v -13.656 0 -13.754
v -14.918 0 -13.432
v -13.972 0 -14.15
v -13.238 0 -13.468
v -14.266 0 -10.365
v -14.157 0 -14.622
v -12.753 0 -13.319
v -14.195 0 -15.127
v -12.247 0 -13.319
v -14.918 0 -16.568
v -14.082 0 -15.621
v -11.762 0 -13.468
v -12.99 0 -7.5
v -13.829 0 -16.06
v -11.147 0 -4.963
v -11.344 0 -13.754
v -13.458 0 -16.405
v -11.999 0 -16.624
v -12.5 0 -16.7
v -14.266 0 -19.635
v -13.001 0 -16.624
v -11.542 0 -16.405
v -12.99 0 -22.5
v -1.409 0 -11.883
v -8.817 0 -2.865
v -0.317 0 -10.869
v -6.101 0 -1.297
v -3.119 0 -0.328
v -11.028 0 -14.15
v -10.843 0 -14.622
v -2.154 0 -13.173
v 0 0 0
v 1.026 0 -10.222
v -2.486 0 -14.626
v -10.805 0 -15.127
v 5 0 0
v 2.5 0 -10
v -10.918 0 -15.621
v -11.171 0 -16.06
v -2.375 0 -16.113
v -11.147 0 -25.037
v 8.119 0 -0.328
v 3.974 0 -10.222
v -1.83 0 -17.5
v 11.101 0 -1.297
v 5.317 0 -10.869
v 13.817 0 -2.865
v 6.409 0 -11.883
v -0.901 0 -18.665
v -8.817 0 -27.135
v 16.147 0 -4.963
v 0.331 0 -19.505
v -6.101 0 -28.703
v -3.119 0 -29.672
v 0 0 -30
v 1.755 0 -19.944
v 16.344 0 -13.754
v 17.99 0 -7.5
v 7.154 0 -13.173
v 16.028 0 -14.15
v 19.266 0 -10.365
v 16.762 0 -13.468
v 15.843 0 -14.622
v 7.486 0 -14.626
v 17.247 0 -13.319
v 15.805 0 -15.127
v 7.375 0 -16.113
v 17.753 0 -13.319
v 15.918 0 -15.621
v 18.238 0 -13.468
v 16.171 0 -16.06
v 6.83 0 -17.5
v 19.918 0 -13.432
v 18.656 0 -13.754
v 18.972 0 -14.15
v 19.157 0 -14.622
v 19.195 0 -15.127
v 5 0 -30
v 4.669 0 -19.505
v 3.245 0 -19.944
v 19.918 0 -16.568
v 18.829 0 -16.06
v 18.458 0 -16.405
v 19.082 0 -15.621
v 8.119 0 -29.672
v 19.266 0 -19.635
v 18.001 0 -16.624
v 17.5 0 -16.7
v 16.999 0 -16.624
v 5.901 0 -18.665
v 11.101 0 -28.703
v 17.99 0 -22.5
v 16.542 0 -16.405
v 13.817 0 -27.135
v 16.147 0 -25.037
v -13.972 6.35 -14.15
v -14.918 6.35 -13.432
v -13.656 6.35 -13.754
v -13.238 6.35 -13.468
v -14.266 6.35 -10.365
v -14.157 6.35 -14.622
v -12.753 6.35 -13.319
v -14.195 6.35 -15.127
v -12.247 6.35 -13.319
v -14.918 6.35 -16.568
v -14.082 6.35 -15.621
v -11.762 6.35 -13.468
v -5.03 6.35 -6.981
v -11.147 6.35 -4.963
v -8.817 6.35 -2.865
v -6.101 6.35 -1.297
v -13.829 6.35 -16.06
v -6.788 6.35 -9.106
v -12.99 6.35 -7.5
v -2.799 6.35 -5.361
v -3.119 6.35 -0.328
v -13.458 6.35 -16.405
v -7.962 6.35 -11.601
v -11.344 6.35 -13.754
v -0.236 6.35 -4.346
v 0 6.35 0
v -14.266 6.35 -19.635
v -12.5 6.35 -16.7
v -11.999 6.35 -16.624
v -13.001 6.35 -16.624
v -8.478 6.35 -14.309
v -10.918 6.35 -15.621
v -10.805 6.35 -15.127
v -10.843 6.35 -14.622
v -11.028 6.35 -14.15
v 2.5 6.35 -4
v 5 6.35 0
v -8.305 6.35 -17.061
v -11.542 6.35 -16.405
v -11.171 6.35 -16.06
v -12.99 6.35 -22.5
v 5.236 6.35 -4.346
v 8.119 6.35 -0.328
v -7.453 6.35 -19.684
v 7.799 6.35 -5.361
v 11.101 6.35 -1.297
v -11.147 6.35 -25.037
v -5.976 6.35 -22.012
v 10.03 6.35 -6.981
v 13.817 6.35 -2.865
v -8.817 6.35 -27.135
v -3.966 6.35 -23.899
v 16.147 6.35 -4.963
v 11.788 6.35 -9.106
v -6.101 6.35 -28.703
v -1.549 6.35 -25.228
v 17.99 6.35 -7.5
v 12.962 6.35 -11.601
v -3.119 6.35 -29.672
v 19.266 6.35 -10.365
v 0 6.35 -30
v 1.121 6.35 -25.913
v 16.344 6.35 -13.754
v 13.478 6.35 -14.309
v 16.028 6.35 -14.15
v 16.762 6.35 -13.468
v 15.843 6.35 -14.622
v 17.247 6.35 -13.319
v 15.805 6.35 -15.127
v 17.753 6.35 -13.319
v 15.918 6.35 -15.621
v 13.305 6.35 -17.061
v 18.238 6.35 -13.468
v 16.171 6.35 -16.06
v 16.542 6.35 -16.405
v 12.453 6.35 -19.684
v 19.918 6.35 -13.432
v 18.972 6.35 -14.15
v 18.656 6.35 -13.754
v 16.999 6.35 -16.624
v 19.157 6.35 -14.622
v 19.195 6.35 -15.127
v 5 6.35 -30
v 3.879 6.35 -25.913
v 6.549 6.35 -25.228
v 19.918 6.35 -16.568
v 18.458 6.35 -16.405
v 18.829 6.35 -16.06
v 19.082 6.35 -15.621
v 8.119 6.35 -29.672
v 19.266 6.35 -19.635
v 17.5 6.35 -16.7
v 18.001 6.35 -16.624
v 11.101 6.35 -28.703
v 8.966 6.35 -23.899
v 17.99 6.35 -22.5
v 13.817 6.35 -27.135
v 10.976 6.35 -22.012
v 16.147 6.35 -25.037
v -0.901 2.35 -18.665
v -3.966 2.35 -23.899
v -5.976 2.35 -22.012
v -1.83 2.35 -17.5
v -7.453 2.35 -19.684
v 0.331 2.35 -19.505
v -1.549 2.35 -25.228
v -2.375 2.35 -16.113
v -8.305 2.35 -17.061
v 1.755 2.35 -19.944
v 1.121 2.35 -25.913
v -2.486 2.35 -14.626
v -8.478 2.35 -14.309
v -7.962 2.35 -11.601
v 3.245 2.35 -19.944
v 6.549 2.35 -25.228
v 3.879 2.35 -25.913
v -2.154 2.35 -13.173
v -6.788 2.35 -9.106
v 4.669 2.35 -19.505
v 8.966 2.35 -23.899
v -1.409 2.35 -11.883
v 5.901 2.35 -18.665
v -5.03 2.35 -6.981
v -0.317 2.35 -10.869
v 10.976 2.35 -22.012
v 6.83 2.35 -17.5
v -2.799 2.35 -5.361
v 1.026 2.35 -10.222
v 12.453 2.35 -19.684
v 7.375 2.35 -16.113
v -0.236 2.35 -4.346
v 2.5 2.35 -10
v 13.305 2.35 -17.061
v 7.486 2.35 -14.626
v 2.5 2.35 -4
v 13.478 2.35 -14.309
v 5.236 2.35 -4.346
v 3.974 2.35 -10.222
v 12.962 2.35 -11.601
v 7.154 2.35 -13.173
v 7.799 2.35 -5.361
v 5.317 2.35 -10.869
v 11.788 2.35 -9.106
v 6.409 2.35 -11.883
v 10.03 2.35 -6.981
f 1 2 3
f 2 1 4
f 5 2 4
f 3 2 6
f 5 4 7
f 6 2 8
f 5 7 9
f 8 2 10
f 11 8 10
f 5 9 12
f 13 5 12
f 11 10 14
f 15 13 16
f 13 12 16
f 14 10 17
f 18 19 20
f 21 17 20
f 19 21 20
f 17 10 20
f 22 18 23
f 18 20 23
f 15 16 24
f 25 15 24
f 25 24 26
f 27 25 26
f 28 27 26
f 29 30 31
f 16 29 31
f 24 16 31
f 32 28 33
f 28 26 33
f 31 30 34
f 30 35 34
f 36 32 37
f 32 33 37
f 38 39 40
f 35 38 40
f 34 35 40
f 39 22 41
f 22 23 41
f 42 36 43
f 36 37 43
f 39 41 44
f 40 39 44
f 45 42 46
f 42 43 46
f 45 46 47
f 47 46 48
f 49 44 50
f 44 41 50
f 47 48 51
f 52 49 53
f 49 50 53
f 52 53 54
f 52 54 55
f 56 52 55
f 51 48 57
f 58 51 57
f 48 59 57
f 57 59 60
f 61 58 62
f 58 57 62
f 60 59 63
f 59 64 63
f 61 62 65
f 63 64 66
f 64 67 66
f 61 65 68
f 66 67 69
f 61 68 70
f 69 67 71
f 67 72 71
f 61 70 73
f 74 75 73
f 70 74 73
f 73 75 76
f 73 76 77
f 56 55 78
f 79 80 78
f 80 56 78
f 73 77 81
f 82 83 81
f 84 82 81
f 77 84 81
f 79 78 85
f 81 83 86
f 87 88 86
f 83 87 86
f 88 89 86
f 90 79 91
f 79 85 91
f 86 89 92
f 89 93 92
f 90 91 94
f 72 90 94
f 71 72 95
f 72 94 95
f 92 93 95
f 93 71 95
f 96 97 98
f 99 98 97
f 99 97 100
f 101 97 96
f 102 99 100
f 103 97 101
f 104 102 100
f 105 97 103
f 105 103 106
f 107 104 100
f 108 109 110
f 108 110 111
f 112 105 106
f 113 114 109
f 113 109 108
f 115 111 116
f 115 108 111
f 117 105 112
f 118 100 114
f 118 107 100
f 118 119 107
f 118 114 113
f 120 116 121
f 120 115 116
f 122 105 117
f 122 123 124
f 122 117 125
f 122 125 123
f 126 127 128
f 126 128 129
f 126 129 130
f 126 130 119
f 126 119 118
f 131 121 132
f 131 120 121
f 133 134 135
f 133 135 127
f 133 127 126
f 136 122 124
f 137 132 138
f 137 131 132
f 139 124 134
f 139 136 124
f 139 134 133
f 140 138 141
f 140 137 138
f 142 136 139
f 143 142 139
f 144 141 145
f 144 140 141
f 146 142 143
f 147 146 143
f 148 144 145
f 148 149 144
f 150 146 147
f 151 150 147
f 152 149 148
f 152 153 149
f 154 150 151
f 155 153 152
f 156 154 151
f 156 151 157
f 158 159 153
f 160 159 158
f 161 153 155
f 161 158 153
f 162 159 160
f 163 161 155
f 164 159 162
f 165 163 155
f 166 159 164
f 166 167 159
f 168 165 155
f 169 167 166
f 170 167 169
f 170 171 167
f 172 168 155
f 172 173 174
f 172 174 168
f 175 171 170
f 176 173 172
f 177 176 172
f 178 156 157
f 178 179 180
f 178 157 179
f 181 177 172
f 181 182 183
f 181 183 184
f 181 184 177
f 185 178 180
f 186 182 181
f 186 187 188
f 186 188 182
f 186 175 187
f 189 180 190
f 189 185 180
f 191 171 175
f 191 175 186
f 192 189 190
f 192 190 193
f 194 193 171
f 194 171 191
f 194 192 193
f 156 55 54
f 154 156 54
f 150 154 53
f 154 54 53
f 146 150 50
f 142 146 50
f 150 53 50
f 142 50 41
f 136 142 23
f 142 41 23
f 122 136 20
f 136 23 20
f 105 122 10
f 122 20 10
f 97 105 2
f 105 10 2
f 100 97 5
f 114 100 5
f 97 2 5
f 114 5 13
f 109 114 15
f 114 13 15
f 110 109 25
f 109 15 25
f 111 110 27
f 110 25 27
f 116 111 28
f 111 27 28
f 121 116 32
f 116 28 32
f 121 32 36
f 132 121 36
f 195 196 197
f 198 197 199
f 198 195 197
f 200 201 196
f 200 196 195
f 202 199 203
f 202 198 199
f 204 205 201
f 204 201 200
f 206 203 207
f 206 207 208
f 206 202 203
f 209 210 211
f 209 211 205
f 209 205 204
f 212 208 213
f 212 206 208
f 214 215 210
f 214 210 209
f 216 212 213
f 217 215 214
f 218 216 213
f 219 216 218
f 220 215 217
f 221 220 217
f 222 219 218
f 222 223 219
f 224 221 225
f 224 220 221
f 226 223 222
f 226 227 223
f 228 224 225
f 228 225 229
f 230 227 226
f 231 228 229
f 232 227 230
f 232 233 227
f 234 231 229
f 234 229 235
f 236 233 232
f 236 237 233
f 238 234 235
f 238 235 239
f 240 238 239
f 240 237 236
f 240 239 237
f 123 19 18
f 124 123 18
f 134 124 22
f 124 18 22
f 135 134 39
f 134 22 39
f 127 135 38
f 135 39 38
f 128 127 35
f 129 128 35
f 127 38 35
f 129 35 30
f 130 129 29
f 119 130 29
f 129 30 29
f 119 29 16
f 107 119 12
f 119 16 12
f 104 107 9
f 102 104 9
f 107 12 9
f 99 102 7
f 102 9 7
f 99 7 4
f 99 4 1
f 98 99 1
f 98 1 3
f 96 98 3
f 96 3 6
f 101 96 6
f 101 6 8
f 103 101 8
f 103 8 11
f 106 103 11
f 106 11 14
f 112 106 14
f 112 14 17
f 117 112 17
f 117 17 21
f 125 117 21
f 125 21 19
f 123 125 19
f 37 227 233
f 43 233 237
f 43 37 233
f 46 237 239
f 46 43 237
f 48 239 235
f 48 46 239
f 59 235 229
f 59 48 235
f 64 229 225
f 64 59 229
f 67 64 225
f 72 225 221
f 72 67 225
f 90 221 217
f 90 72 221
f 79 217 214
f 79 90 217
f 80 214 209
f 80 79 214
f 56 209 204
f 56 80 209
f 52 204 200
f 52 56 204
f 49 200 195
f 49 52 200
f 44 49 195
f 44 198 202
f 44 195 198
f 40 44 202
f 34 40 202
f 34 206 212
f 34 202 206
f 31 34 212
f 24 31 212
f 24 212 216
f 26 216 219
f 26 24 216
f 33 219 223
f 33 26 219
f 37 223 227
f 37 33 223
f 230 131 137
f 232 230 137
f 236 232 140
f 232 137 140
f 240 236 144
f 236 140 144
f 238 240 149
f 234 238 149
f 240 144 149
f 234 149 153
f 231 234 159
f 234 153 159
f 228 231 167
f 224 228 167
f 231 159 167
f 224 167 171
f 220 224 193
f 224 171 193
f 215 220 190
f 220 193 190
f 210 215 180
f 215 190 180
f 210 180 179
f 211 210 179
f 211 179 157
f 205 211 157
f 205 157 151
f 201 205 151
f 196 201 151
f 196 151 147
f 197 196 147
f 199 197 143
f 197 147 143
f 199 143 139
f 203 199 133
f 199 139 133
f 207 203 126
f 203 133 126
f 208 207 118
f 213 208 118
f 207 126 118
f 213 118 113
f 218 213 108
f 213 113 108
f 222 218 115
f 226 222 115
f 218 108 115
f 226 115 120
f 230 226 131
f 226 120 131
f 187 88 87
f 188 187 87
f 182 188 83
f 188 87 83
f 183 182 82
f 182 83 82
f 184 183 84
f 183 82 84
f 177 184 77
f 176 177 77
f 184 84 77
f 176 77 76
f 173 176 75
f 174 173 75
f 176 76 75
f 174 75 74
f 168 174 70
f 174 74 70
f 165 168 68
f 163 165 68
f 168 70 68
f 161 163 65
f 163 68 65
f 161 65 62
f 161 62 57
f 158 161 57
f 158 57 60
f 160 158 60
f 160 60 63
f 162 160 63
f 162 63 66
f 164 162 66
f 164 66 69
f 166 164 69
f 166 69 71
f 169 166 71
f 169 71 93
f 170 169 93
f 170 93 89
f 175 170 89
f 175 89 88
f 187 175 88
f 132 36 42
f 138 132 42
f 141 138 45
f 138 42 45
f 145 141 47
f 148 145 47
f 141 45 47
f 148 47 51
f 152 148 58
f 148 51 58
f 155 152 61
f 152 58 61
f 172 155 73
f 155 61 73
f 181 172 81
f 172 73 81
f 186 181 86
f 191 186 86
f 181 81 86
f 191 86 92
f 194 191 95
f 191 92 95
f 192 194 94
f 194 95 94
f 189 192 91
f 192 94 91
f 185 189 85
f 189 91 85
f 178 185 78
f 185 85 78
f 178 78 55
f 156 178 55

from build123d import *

# Parameters (mm, degrees)
SKETCH3_R            = 5
BOSS_EXTRUDE1_DEPTH  = 6.35
SKETCH4_R            = 11
CUT_EXTRUDE1_DEPTH   = 4
M3_CLEARANCE_HOLE1_D = 3.4


with BuildPart() as part:
    # Sketch3 → Boss-Extrude1 (new body)
    with BuildSketch(Plane(origin=(0, 0, 0), x_dir=(1, 0, 0), z_dir=(0, 1, 0))):
        with BuildLine():
            Line((0, 0), (5, 0))
            ThreePointArc((5, 0), (20, 15), (5, 30))
            Line((5, 30), (0, 30))
            ThreePointArc((0, 30), (-15, 15), (0, 0))
        make_face()
        with Locations(Location((2.5, 15, 0), (0, 0, 270))):
            Circle(SKETCH3_R, mode=Mode.SUBTRACT)
    extrude(amount=BOSS_EXTRUDE1_DEPTH)

    # Sketch4 → Cut-Extrude1 (cut)
    with BuildSketch(Plane(origin=(0, 6.35, 0), x_dir=(1, 0, 0), z_dir=(0, 1, 0))):
        with Locations(Location((2.5, 15, 0), (0, 0, 270))):
            Circle(SKETCH4_R)
    extrude(amount=-CUT_EXTRUDE1_DEPTH, mode=Mode.SUBTRACT)

    # M3 Clearance Hole1 (through all)
    with Locations(Plane(origin=(-12.5, 6.35, -15), x_dir=(0, 0, 1), z_dir=(0, 1, 0))):
        with Locations((0, 0), (0, 30)):
            Hole(M3_CLEARANCE_HOLE1_D / 2)


solid = part.part
